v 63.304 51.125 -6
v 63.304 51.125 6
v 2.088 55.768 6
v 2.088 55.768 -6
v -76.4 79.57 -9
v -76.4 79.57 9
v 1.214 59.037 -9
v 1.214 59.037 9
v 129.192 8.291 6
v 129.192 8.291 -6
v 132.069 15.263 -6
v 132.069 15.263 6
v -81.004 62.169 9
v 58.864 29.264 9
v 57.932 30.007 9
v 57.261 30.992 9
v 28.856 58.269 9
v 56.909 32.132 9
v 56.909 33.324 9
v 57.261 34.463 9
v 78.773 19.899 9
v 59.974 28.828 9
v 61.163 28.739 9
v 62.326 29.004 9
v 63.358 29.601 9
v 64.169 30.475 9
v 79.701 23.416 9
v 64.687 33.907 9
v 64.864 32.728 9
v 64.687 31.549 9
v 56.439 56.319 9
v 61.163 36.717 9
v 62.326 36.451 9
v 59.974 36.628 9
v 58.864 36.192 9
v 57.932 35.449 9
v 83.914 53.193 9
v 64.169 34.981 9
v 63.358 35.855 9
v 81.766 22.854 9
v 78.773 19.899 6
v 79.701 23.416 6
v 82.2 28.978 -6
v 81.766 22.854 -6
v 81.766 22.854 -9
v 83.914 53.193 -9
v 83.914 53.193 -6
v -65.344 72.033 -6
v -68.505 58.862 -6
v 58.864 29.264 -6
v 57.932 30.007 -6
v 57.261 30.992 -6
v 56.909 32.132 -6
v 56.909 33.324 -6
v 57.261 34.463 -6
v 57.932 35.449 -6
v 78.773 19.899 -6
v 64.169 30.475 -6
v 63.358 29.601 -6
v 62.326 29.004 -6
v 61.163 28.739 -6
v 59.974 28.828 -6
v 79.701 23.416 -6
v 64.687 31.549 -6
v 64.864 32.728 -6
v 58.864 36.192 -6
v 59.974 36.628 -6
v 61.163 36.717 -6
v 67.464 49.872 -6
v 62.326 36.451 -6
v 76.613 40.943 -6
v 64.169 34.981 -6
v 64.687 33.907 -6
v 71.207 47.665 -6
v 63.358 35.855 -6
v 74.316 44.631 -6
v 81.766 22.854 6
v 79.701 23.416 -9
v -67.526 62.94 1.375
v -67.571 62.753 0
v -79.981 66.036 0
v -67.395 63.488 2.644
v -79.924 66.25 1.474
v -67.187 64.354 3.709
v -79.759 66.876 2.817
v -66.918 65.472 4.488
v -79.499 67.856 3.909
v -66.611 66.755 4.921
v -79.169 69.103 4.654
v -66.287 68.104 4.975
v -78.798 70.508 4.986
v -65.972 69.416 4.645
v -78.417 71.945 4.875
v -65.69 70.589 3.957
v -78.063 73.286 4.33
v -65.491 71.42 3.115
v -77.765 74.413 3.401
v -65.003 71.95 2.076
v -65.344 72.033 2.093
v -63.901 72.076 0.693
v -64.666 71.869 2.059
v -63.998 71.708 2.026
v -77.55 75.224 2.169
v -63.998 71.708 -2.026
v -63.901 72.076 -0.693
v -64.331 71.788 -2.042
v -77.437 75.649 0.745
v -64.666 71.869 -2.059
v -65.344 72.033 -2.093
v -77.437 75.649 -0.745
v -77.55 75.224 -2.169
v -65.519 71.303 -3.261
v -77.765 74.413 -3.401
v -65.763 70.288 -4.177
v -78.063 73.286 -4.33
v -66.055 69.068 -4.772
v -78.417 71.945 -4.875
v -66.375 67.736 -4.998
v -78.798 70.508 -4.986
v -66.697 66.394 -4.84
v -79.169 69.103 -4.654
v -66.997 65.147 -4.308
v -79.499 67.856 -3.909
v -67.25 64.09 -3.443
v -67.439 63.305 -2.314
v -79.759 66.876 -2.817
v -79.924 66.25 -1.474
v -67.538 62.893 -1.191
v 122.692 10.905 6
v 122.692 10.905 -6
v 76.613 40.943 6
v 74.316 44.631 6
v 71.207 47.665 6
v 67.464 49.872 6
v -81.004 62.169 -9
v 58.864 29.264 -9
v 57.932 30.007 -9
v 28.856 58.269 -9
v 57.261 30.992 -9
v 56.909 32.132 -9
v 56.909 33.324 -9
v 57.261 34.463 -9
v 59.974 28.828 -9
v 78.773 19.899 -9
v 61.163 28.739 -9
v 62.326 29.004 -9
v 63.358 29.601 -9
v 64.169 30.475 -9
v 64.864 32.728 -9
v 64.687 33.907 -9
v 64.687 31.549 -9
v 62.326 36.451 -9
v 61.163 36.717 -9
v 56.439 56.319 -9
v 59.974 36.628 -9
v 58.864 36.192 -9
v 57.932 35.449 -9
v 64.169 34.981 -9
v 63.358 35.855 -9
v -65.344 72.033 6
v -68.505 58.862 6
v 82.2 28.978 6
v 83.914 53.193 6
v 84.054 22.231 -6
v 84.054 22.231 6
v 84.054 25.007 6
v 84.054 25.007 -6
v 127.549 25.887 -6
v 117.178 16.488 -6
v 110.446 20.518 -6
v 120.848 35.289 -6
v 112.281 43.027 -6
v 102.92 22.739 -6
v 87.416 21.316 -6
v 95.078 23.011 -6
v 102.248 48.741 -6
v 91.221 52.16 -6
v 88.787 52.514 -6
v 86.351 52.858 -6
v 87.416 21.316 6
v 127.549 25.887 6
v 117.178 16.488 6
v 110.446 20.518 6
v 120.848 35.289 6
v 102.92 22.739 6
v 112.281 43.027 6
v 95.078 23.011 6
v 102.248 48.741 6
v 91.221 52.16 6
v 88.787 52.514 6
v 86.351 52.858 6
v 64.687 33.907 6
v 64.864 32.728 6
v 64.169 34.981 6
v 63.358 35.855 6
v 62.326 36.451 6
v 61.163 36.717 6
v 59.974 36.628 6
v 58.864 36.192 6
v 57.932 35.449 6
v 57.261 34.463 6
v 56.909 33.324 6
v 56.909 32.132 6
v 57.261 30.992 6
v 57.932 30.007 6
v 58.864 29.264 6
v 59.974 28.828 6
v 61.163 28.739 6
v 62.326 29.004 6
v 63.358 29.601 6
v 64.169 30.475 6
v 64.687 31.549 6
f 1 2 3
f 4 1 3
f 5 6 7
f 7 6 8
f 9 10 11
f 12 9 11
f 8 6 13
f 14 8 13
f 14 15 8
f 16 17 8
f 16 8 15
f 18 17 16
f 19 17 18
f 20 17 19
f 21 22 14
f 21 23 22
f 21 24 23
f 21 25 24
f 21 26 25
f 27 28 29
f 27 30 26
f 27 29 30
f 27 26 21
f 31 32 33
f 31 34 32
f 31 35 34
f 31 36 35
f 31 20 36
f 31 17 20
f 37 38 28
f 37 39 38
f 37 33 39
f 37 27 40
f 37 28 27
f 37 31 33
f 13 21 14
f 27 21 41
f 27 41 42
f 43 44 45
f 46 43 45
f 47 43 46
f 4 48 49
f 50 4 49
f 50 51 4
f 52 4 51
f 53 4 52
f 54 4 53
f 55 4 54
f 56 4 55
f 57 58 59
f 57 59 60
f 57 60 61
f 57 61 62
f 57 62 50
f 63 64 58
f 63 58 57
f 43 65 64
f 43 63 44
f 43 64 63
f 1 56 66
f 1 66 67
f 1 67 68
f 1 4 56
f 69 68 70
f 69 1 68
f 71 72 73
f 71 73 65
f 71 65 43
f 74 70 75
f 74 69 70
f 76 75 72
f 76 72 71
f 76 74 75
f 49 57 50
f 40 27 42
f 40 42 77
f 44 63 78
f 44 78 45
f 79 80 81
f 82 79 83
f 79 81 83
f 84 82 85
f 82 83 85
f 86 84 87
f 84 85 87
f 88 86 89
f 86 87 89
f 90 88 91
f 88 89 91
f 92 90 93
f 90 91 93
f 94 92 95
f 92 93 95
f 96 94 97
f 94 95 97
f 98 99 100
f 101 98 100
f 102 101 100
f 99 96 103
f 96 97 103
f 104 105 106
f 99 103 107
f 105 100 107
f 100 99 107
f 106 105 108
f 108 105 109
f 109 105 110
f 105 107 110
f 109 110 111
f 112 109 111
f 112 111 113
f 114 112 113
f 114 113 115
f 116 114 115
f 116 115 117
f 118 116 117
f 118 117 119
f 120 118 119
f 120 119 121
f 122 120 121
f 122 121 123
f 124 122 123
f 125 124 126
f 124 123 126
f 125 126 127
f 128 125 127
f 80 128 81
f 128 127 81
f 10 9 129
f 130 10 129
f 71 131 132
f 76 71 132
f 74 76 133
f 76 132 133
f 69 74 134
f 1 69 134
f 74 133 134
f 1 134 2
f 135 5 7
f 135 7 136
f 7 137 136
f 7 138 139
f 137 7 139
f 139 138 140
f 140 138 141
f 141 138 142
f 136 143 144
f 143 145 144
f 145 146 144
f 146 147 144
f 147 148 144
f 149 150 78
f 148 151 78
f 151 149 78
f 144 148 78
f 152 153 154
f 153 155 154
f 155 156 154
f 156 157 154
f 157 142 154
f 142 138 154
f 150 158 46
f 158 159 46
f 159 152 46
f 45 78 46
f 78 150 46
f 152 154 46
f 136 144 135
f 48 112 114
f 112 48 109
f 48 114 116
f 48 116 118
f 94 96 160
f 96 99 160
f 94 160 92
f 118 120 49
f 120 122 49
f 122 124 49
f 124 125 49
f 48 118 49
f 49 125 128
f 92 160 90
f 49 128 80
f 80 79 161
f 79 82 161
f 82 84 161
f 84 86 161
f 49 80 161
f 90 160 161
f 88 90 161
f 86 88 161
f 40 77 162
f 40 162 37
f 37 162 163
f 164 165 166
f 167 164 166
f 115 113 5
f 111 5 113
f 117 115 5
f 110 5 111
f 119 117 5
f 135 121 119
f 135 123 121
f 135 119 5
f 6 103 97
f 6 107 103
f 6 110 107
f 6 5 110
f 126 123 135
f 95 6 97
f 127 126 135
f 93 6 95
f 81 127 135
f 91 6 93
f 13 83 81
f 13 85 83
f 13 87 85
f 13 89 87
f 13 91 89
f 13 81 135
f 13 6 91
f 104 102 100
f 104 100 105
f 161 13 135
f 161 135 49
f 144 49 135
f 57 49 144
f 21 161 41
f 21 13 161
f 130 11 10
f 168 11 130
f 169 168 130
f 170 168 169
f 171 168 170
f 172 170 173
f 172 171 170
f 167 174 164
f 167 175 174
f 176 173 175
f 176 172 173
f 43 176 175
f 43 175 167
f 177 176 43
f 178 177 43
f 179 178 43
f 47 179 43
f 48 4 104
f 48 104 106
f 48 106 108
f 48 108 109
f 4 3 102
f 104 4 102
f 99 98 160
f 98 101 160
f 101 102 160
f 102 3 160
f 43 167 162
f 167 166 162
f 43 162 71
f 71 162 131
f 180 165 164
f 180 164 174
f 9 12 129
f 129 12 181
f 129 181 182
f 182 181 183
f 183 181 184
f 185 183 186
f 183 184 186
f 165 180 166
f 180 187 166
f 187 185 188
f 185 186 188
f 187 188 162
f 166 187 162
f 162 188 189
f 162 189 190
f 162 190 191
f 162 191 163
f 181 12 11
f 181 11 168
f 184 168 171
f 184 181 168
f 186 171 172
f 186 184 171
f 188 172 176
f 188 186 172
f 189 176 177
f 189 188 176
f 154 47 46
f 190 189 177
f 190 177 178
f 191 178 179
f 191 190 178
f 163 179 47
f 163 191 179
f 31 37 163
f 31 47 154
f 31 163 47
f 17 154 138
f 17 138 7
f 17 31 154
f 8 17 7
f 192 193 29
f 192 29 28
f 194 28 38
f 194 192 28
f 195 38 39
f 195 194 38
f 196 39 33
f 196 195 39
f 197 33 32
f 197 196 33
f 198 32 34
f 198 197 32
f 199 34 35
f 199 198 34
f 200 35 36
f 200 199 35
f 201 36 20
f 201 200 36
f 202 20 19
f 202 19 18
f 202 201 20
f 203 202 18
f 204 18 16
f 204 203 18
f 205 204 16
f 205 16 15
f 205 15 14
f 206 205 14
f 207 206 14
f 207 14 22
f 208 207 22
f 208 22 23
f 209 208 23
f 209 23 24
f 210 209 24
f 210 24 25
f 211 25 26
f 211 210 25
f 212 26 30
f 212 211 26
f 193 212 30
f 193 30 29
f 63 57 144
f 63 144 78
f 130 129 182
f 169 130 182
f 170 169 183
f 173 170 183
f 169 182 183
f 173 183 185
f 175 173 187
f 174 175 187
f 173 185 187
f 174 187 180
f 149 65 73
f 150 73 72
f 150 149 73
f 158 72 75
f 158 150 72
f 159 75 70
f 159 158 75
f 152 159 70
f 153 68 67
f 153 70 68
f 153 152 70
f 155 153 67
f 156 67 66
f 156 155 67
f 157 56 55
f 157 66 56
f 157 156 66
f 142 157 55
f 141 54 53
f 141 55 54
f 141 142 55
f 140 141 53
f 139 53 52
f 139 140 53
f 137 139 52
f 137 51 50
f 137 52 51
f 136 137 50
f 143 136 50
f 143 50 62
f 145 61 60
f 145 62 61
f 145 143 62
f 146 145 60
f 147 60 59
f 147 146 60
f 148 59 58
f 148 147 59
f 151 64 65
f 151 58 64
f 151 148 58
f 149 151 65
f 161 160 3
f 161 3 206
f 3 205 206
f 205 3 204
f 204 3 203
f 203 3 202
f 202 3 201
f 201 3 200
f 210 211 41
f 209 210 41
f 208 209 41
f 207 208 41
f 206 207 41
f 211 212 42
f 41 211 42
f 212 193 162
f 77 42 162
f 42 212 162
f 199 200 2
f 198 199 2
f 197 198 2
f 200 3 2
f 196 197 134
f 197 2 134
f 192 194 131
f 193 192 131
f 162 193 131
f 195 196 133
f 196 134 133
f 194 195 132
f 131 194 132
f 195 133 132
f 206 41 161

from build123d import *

# Parameters (mm, degrees)
SKETCH005_R     = 4
PAD003_DEPTH    = 9
POCKET002_DEPTH = 453.7991983662
POCKET003_DEPTH = 6
SKETCH009_R     = 5
POCKET004_DEPTH = 14


with BuildPart() as part:
    # Sketch005 → Pad003 (new body, symmetric)
    with BuildSketch(Plane.XY):
        with BuildLine():
            Line((129.191528, 8.290887), (132.069077, 15.263238))
            ThreePointArc((132.069077, 15.263238), (116.7747181113, 39.3905983189), (91.2212646928, 52.1604044318))
            ThreePointArc((91.2212646928, 52.1604044318), (46.3377236615, 57.1709115012), (1.21394, 59.036812))
            Line((-76.4001571445, 79.5700210048), (1.21394, 59.036812))
            Line((-76.4001571445, 79.5700210048), (-81.0037719697, 62.168678225))
            Line((-81.0037719697, 62.168678225), (78.772919, 19.898932))
            Line((78.772919, 19.898932), (79.701164, 23.416142))
            Line((79.701164, 23.416142), (87.415985, 21.315922))
            ThreePointArc((122.691841, 10.904919), (106.7527492861, 21.8666290226), (87.415985, 21.315922))
            Line((129.191528, 8.290887), (122.691841, 10.904919))
        make_face()
        with Locations((60.86446, 32.72789)):
            Circle(SKETCH005_R, mode=Mode.SUBTRACT)
    extrude(amount=PAD003_DEPTH, both=True)

    # Sketch007 → Pocket002 (cut, through all)
    with BuildSketch(Plane.XY.offset(6)):
        with BuildLine():
            Line((81.633926, 20.987476), (84.018715, 54.669346))
            Line((84.018715, 54.669346), (91.8155354317, 53.6254730737))
            ThreePointArc((133.5781814805, 14.8051820085), (118.8696341007, 40.855964108), (91.8155354317, 53.6254730737))
            Line((133.5781814805, 14.8051820085), (129.179794, 5.660023))
            Line((129.179794, 5.660023), (81.633926, 20.987476))
        make_face()
    pocket002 = extrude(amount=POCKET002_DEPTH, mode=Mode.SUBTRACT)

    # Mirrored: Pocket002 across XY
    add(pocket002.mirror(Plane.XY), mode=Mode.SUBTRACT)

    # Sketch008 → Pocket003 (cut, symmetric)
    with BuildSketch(Plane.XY):
        with BuildLine():
            Line((84.0540226162, 25.0066254975), (76.6128766006, 40.9426462345))
            ThreePointArc((76.6128766006, 40.9426462345), (71.2066025484, 47.6653428321), (63.3038481091, 51.1249556635))
            Line((63.3038481091, 51.1249556635), (2.088246, 55.768429))
            Line((2.088246, 55.768429), (-65.343964, 72.03257))
            Line((-65.343964, 72.03257), (-69.729797, 53.758251))
            Line((-69.729797, 53.758251), (84.0540226162, 17.940607))
            Line((84.0540226162, 17.940607), (84.0540226162, 25.0066254975))
        make_face()
    extrude(amount=POCKET003_DEPTH, both=True, mode=Mode.SUBTRACT)

    # Sketch009 (on DatumPlane) → Pocket004 (cut)
    with BuildSketch(Plane(origin=(-76.4001571445, 79.5700210048, 0), x_dir=(-0.2557563792, -0.9667412655, 0), z_dir=(-0.9667412655, 0.2557563792, 0))):
        with Locations((9, 0)):
            Circle(SKETCH009_R)
    extrude(amount=-POCKET004_DEPTH, mode=Mode.SUBTRACT)


solid = part.part
